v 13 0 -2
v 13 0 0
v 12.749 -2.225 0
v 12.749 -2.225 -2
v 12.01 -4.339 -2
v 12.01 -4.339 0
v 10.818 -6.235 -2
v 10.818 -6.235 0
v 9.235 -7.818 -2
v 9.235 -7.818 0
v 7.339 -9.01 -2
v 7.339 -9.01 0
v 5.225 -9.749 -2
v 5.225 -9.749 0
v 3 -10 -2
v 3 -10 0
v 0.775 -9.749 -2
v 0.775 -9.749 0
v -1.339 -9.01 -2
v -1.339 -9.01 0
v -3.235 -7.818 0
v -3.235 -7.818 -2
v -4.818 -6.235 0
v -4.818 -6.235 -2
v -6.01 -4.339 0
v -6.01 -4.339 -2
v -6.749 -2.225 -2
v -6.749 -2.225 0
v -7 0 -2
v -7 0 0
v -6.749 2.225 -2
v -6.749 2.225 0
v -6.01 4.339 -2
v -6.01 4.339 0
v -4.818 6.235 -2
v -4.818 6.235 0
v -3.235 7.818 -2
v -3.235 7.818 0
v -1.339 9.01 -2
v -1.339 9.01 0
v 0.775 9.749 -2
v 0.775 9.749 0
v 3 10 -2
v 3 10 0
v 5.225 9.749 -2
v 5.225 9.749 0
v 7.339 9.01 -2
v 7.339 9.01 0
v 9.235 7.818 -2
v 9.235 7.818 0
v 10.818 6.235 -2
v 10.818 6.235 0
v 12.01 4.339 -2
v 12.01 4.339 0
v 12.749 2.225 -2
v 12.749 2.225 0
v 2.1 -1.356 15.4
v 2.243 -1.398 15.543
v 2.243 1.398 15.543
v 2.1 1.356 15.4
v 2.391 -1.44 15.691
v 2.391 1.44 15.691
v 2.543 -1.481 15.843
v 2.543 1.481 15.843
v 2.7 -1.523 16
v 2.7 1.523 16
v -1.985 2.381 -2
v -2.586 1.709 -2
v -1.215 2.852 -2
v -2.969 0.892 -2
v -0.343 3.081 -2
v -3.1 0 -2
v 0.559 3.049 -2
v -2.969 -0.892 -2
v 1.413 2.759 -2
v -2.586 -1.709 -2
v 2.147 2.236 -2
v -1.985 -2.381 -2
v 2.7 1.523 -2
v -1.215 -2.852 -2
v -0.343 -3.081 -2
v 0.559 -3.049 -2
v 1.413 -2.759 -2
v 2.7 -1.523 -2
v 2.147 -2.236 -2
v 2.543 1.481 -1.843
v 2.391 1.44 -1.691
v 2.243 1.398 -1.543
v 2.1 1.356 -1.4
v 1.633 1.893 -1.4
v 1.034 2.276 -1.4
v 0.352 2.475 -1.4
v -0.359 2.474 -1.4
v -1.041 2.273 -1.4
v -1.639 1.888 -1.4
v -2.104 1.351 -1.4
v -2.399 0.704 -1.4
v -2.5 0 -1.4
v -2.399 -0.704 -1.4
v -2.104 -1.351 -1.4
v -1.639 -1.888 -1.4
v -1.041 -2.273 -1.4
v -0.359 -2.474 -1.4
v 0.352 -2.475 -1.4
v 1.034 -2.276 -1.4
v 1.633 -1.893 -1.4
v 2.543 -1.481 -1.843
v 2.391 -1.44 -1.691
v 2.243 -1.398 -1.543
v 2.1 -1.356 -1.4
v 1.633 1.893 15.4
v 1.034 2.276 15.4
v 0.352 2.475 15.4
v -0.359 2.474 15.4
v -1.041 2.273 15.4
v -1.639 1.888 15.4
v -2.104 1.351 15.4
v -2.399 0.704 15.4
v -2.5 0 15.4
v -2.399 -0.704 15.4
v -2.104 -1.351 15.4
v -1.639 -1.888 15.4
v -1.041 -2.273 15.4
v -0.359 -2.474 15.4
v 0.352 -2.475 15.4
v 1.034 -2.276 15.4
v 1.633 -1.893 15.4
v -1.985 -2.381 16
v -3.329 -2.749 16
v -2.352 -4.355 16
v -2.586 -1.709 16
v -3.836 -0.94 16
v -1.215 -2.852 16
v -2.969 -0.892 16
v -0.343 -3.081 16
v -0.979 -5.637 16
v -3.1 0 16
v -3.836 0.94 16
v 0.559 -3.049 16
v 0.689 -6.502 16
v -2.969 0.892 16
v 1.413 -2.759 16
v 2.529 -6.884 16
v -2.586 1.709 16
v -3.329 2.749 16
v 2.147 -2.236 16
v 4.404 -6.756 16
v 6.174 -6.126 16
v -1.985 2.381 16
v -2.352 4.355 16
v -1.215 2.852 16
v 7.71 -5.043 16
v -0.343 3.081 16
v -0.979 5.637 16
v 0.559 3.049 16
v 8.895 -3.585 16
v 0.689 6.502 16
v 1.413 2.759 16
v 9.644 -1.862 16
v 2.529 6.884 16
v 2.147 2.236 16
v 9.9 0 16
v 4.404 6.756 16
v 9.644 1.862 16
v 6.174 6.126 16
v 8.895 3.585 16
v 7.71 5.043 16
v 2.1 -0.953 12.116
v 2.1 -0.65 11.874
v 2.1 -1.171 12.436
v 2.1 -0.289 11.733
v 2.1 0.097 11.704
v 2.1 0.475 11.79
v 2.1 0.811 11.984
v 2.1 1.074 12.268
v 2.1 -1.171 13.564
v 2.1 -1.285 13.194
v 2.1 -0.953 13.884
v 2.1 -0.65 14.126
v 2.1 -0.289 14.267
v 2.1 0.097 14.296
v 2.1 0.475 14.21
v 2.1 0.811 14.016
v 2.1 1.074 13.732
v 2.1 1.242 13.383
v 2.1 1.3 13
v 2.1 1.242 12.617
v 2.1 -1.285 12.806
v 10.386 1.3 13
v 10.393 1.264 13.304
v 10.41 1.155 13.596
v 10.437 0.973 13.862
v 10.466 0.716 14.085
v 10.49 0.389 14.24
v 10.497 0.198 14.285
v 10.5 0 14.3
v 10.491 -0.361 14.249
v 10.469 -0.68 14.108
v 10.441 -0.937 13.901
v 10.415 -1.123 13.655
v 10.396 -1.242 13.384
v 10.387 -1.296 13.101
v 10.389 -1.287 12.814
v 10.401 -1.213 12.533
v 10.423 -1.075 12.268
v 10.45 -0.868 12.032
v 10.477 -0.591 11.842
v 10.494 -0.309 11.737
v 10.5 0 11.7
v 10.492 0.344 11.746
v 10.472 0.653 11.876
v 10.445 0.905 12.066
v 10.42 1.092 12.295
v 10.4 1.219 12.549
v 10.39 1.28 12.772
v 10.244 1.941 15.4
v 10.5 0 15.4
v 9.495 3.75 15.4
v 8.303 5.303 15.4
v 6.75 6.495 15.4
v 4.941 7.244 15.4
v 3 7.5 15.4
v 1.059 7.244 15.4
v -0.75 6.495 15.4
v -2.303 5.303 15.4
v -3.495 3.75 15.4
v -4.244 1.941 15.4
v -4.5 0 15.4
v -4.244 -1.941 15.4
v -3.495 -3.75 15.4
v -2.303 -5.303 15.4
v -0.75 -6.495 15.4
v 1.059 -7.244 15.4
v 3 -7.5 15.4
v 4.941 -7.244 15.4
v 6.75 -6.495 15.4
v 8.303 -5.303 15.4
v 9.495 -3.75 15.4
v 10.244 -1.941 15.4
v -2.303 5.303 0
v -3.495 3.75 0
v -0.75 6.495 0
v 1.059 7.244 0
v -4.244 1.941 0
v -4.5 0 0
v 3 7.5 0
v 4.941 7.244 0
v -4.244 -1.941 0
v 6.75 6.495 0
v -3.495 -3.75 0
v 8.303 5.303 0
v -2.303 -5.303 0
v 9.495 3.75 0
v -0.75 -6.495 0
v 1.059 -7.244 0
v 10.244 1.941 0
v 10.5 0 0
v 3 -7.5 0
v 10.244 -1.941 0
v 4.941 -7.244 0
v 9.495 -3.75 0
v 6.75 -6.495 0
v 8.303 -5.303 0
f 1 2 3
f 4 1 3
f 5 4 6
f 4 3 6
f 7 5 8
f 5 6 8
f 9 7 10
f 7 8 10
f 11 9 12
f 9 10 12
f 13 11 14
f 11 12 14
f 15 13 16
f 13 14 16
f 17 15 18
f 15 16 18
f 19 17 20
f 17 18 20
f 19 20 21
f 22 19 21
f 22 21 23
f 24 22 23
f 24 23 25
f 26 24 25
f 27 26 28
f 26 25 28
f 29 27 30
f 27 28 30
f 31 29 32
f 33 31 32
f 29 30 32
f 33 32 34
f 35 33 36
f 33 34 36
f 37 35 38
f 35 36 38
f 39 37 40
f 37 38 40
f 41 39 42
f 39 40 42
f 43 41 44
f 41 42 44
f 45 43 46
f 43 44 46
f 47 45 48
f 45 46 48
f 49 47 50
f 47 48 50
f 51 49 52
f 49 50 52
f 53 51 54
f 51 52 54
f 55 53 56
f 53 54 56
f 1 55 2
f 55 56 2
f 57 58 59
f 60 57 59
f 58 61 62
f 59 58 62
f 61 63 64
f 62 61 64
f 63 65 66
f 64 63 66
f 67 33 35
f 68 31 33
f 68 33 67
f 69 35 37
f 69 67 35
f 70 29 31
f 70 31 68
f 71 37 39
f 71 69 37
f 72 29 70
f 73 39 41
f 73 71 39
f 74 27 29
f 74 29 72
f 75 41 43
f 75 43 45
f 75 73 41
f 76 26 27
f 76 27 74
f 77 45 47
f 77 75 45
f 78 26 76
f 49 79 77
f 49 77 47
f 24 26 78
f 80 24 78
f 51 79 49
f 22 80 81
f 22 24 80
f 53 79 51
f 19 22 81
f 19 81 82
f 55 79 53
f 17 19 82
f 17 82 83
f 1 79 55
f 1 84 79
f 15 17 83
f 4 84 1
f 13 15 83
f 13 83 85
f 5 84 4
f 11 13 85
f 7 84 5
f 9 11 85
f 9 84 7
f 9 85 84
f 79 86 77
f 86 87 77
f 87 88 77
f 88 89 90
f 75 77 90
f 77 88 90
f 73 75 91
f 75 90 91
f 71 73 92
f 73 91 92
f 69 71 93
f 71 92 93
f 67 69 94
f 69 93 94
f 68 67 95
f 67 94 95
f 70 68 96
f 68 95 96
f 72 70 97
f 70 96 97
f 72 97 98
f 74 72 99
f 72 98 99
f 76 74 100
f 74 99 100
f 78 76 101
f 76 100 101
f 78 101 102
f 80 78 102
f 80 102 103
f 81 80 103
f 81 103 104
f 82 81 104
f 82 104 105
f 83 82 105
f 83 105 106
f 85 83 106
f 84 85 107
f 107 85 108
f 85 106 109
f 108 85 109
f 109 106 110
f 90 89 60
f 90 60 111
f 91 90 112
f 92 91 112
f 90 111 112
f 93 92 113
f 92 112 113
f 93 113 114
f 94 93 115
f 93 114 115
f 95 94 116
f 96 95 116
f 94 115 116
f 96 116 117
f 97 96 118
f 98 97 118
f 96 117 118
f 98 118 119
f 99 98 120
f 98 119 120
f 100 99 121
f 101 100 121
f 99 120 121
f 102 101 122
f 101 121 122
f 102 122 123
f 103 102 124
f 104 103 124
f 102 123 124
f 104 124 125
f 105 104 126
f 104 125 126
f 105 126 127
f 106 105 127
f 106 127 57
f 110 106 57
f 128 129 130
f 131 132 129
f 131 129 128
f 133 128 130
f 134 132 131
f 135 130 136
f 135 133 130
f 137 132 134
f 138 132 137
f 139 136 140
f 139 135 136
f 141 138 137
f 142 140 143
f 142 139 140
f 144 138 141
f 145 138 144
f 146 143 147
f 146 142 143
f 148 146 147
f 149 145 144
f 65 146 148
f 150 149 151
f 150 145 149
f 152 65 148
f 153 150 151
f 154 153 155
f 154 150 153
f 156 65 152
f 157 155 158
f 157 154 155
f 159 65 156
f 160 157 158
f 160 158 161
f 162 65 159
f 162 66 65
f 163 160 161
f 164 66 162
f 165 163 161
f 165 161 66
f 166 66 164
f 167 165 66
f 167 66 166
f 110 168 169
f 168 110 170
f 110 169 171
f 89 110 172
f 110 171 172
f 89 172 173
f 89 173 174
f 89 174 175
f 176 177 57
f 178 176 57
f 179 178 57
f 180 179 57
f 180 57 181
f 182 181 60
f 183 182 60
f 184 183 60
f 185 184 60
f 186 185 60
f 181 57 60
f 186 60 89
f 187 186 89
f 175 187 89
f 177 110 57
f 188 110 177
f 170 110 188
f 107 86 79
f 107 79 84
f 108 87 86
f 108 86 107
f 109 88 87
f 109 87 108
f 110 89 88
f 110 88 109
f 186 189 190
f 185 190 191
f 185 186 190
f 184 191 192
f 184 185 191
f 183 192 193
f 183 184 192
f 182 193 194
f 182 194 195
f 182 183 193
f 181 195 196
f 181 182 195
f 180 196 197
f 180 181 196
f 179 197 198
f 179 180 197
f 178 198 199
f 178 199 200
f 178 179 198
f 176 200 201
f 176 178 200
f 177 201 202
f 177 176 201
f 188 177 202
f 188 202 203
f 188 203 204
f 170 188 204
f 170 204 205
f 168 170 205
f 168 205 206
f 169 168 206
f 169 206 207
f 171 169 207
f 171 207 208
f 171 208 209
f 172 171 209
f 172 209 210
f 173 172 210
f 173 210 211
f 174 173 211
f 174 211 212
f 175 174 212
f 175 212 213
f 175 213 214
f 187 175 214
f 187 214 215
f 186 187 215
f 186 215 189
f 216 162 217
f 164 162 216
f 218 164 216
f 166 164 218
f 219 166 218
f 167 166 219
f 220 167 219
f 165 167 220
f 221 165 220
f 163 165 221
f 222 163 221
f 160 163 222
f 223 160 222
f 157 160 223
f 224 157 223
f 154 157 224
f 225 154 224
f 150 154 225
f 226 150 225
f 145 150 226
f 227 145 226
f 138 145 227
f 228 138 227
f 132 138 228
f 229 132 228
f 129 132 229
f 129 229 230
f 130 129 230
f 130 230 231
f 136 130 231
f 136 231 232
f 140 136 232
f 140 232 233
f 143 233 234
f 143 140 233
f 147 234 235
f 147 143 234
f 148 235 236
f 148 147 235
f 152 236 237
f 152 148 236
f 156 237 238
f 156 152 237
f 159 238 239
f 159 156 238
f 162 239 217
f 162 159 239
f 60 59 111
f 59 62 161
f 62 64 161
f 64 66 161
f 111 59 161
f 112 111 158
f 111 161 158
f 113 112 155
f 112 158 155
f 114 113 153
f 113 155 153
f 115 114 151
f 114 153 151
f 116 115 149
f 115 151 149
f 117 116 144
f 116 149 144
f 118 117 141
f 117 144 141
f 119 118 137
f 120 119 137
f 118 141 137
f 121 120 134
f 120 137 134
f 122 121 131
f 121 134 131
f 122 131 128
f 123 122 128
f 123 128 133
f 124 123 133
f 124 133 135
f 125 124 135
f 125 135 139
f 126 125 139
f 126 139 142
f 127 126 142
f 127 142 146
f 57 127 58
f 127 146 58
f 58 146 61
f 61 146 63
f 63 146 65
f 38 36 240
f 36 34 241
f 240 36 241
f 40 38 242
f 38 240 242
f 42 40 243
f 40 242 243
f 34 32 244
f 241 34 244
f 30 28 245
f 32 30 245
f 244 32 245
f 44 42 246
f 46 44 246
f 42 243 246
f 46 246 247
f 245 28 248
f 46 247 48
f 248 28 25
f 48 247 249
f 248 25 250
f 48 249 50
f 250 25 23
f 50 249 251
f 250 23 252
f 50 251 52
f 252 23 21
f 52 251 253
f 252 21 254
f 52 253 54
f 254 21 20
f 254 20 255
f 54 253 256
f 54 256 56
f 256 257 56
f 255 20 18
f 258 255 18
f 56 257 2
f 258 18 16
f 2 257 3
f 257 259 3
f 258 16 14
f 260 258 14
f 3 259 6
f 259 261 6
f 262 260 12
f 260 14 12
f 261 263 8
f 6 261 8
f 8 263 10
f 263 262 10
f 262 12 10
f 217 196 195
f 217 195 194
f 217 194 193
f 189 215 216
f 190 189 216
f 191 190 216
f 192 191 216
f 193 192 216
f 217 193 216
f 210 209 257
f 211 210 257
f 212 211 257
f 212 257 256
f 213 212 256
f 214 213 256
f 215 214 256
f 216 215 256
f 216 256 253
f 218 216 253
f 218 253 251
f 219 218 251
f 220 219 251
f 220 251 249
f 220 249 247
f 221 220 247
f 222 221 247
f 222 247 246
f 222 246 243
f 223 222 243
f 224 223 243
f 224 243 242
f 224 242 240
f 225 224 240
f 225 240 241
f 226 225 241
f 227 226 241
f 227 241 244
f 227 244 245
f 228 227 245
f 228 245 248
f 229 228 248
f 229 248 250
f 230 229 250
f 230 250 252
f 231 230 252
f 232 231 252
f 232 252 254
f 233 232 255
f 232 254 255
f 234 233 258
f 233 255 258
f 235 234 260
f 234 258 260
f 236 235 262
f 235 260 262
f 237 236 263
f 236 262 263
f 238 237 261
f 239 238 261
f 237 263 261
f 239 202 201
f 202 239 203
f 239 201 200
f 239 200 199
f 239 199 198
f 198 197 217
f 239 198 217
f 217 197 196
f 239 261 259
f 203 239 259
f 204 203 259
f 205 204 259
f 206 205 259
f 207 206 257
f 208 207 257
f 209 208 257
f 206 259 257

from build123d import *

# Parameters (mm, degrees)
SKETCH_R        = 7.5
PAD_DEPTH       = 16
SKETCH001_R     = 10
PAD001_DEPTH    = 2
SKETCH002_R     = 1.3
POCKET_DEPTH    = 13.001
POCKET001_DEPTH = 18.001
CHAMFER_SIZE    = 0.6


with BuildPart() as part:
    # Sketch → Pad (new body)
    with BuildSketch(Plane.XY):
        with Locations((3, 0)):
            Circle(SKETCH_R)
    extrude(amount=PAD_DEPTH)

    # Sketch001 (on Face2 of Pad) → Pad001 (join)
    with BuildSketch(Plane(origin=(0, 0, 0), x_dir=(1, 0, 0), z_dir=(0, 0, -1))):
        with Locations((3, 0)):
            Circle(SKETCH001_R)
    extrude(amount=PAD001_DEPTH)

    # Sketch002 → Pocket (cut, through all)
    with BuildSketch(Plane.YZ):
        with Locations((0, 13)):
            Circle(SKETCH002_R)
    extrude(amount=POCKET_DEPTH, mode=Mode.SUBTRACT)

    # Sketch003 (on Face6 of Pocket) → Pocket001 (cut, through all)
    with BuildSketch(Plane.XY.offset(16)):
        with BuildLine():
            ThreePointArc((2.1, 1.356466), (-2.5, 0), (2.1, -1.356466))
            Line((2.1, -1.356466), (2.1, 1.356466))
        make_face()
    extrude(amount=-POCKET001_DEPTH, mode=Mode.SUBTRACT)

    # Chamfer
    chamfer_edges = [part.edges().sort_by_distance(p)[0] for p in [
        (-4.5, 0, 16),
        (2.1, 0, 16),
        (-2.5, 0, 16),
        (-2.5, 0, -2),
        (2.1, 0, -2),
    ]]
    chamfer(chamfer_edges, length=CHAMFER_SIZE)


solid = part.part
